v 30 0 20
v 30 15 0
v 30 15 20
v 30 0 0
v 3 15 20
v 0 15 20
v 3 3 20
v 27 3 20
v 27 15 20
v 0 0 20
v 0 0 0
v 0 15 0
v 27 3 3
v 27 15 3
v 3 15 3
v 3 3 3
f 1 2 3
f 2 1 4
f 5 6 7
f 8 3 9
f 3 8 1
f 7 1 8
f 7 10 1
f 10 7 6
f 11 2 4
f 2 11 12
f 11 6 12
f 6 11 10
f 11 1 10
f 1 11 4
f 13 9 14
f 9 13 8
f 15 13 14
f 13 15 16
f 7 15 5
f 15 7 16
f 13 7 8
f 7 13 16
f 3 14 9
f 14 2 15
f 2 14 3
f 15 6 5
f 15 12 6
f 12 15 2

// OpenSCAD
// Shell / Wall thickness: a hollow shelled box, cut away on one side to
// show the cross-section and the resulting wall thickness.
wt = 3; ow = 30; od = 30; oh = 20;

difference() {
    cube([ow, od, oh]);
    translate([wt, wt, wt]) cube([ow - 2 * wt, od - 2 * wt, oh - wt + 1]);
    // cut away the front half to reveal the shell cross-section
    translate([-1, od / 2, -1]) cube([ow + 2, od / 2 + 1, oh + 2]);
}
